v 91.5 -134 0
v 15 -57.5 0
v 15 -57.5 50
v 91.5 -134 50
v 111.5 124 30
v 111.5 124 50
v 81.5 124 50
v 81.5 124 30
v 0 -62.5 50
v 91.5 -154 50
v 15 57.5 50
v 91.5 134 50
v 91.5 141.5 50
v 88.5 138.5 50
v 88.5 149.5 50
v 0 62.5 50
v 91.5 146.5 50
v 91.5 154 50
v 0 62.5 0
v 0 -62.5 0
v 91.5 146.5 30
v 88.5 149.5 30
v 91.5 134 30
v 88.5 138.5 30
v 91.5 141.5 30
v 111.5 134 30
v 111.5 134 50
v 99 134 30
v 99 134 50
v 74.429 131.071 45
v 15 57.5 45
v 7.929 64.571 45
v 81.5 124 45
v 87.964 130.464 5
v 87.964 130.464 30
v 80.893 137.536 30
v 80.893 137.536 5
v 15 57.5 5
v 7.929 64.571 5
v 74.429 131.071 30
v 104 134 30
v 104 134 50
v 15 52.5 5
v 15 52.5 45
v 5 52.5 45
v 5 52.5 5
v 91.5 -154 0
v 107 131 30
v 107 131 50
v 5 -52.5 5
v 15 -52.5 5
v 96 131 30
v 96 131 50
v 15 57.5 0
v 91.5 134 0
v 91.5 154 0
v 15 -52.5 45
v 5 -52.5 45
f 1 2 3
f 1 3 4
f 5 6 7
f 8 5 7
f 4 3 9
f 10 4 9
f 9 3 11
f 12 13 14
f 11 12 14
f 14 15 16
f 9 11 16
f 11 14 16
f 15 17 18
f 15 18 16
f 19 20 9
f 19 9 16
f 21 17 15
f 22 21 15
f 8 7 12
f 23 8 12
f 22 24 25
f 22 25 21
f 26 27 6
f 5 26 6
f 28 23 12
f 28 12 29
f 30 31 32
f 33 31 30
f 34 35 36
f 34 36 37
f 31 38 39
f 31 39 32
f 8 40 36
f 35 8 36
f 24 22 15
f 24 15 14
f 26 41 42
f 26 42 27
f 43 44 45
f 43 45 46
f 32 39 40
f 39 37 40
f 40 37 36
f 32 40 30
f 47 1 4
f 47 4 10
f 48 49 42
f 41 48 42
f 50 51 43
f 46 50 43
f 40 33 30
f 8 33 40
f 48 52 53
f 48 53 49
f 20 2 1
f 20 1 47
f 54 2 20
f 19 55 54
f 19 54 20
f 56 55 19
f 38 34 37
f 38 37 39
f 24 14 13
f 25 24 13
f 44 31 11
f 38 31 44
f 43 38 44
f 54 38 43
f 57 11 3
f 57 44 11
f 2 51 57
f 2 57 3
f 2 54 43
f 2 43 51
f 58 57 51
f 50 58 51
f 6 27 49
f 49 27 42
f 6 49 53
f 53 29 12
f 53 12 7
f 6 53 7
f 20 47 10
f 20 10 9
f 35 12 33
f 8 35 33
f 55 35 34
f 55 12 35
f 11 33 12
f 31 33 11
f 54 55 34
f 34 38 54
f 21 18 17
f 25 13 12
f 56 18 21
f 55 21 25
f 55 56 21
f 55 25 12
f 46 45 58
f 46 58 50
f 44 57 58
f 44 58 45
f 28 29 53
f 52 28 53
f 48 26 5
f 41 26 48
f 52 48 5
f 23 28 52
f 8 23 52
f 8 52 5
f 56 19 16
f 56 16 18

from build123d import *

# Parameters (mm, degrees)
BOSS_EXTRU_1_DEPTH      = 50
BOSS_EXTRU_2_DEPTH      = 20
ENL_V_MAT_EXTRU_1_DEPTH = 10
ESQUISSE4_W             = 40
ESQUISSE4_H             = 105
ENL_V_MAT_EXTRU_2_DEPTH = 10
ENL_V_MAT_EXTRU_3_DEPTH = 20


with BuildPart() as part:
    # Esquisse1 → Boss.-Extru.1 (new body)
    with BuildSketch(Plane.XY):
        Polygon((0, -62.5), (0, 62.5), (91.5, 154), (91.5, 134), (15, 57.5), (15, -57.5), (91.5, -134), (91.5, -154), align=None)
    extrude(amount=BOSS_EXTRU_1_DEPTH)

    # Esquisse3 → Enlèv. mat.-Extru.1 (cut)
    with BuildSketch(Plane(origin=(-21.25, 21.25, 0), x_dir=(0, 0, -1), z_dir=(0.7071067811865468, -0.7071067811865482, 0))):
        Polygon((-5, 51.265241636), (-45, 51.265241636), (-45, 145.310443534), (-30, 145.310443534), (-30, 154.452579158), (-5, 154.452579158), align=None)
    extrude(amount=-ENL_V_MAT_EXTRU_1_DEPTH, mode=Mode.SUBTRACT)

    # Esquisse4 → Enlèv. mat.-Extru.2 (cut)
    with BuildSketch(Plane(origin=(15, 0, 0), x_dir=(0, 0, -1), z_dir=(1, 0, 0))):
        with Locations((-25, 0)):
            Rectangle(ESQUISSE4_W, ESQUISSE4_H)
    extrude(amount=-ENL_V_MAT_EXTRU_2_DEPTH, mode=Mode.SUBTRACT)

    # Esquisse5 → Enlèv. mat.-Extru.3 (cut)
    with BuildSketch(Plane.XY.offset(50)):
        Polygon((91.5, 146.5), (88.5, 149.5), (88.5, 138.5), (91.5, 141.5), align=None)
    extrude(amount=-ENL_V_MAT_EXTRU_3_DEPTH, mode=Mode.SUBTRACT)


with BuildPart() as body_2:
    # Esquisse2 → Boss.-Extru.2 (new body)
    with BuildSketch(Plane.XY.offset(50)):
        Polygon((91.5, 134), (99, 134), (96, 131), (107, 131), (104, 134), (111.5, 134), (111.5, 124), (81.5, 124), align=None)
    extrude(amount=-BOSS_EXTRU_2_DEPTH)


solid = Compound([part.part, body_2.part])
